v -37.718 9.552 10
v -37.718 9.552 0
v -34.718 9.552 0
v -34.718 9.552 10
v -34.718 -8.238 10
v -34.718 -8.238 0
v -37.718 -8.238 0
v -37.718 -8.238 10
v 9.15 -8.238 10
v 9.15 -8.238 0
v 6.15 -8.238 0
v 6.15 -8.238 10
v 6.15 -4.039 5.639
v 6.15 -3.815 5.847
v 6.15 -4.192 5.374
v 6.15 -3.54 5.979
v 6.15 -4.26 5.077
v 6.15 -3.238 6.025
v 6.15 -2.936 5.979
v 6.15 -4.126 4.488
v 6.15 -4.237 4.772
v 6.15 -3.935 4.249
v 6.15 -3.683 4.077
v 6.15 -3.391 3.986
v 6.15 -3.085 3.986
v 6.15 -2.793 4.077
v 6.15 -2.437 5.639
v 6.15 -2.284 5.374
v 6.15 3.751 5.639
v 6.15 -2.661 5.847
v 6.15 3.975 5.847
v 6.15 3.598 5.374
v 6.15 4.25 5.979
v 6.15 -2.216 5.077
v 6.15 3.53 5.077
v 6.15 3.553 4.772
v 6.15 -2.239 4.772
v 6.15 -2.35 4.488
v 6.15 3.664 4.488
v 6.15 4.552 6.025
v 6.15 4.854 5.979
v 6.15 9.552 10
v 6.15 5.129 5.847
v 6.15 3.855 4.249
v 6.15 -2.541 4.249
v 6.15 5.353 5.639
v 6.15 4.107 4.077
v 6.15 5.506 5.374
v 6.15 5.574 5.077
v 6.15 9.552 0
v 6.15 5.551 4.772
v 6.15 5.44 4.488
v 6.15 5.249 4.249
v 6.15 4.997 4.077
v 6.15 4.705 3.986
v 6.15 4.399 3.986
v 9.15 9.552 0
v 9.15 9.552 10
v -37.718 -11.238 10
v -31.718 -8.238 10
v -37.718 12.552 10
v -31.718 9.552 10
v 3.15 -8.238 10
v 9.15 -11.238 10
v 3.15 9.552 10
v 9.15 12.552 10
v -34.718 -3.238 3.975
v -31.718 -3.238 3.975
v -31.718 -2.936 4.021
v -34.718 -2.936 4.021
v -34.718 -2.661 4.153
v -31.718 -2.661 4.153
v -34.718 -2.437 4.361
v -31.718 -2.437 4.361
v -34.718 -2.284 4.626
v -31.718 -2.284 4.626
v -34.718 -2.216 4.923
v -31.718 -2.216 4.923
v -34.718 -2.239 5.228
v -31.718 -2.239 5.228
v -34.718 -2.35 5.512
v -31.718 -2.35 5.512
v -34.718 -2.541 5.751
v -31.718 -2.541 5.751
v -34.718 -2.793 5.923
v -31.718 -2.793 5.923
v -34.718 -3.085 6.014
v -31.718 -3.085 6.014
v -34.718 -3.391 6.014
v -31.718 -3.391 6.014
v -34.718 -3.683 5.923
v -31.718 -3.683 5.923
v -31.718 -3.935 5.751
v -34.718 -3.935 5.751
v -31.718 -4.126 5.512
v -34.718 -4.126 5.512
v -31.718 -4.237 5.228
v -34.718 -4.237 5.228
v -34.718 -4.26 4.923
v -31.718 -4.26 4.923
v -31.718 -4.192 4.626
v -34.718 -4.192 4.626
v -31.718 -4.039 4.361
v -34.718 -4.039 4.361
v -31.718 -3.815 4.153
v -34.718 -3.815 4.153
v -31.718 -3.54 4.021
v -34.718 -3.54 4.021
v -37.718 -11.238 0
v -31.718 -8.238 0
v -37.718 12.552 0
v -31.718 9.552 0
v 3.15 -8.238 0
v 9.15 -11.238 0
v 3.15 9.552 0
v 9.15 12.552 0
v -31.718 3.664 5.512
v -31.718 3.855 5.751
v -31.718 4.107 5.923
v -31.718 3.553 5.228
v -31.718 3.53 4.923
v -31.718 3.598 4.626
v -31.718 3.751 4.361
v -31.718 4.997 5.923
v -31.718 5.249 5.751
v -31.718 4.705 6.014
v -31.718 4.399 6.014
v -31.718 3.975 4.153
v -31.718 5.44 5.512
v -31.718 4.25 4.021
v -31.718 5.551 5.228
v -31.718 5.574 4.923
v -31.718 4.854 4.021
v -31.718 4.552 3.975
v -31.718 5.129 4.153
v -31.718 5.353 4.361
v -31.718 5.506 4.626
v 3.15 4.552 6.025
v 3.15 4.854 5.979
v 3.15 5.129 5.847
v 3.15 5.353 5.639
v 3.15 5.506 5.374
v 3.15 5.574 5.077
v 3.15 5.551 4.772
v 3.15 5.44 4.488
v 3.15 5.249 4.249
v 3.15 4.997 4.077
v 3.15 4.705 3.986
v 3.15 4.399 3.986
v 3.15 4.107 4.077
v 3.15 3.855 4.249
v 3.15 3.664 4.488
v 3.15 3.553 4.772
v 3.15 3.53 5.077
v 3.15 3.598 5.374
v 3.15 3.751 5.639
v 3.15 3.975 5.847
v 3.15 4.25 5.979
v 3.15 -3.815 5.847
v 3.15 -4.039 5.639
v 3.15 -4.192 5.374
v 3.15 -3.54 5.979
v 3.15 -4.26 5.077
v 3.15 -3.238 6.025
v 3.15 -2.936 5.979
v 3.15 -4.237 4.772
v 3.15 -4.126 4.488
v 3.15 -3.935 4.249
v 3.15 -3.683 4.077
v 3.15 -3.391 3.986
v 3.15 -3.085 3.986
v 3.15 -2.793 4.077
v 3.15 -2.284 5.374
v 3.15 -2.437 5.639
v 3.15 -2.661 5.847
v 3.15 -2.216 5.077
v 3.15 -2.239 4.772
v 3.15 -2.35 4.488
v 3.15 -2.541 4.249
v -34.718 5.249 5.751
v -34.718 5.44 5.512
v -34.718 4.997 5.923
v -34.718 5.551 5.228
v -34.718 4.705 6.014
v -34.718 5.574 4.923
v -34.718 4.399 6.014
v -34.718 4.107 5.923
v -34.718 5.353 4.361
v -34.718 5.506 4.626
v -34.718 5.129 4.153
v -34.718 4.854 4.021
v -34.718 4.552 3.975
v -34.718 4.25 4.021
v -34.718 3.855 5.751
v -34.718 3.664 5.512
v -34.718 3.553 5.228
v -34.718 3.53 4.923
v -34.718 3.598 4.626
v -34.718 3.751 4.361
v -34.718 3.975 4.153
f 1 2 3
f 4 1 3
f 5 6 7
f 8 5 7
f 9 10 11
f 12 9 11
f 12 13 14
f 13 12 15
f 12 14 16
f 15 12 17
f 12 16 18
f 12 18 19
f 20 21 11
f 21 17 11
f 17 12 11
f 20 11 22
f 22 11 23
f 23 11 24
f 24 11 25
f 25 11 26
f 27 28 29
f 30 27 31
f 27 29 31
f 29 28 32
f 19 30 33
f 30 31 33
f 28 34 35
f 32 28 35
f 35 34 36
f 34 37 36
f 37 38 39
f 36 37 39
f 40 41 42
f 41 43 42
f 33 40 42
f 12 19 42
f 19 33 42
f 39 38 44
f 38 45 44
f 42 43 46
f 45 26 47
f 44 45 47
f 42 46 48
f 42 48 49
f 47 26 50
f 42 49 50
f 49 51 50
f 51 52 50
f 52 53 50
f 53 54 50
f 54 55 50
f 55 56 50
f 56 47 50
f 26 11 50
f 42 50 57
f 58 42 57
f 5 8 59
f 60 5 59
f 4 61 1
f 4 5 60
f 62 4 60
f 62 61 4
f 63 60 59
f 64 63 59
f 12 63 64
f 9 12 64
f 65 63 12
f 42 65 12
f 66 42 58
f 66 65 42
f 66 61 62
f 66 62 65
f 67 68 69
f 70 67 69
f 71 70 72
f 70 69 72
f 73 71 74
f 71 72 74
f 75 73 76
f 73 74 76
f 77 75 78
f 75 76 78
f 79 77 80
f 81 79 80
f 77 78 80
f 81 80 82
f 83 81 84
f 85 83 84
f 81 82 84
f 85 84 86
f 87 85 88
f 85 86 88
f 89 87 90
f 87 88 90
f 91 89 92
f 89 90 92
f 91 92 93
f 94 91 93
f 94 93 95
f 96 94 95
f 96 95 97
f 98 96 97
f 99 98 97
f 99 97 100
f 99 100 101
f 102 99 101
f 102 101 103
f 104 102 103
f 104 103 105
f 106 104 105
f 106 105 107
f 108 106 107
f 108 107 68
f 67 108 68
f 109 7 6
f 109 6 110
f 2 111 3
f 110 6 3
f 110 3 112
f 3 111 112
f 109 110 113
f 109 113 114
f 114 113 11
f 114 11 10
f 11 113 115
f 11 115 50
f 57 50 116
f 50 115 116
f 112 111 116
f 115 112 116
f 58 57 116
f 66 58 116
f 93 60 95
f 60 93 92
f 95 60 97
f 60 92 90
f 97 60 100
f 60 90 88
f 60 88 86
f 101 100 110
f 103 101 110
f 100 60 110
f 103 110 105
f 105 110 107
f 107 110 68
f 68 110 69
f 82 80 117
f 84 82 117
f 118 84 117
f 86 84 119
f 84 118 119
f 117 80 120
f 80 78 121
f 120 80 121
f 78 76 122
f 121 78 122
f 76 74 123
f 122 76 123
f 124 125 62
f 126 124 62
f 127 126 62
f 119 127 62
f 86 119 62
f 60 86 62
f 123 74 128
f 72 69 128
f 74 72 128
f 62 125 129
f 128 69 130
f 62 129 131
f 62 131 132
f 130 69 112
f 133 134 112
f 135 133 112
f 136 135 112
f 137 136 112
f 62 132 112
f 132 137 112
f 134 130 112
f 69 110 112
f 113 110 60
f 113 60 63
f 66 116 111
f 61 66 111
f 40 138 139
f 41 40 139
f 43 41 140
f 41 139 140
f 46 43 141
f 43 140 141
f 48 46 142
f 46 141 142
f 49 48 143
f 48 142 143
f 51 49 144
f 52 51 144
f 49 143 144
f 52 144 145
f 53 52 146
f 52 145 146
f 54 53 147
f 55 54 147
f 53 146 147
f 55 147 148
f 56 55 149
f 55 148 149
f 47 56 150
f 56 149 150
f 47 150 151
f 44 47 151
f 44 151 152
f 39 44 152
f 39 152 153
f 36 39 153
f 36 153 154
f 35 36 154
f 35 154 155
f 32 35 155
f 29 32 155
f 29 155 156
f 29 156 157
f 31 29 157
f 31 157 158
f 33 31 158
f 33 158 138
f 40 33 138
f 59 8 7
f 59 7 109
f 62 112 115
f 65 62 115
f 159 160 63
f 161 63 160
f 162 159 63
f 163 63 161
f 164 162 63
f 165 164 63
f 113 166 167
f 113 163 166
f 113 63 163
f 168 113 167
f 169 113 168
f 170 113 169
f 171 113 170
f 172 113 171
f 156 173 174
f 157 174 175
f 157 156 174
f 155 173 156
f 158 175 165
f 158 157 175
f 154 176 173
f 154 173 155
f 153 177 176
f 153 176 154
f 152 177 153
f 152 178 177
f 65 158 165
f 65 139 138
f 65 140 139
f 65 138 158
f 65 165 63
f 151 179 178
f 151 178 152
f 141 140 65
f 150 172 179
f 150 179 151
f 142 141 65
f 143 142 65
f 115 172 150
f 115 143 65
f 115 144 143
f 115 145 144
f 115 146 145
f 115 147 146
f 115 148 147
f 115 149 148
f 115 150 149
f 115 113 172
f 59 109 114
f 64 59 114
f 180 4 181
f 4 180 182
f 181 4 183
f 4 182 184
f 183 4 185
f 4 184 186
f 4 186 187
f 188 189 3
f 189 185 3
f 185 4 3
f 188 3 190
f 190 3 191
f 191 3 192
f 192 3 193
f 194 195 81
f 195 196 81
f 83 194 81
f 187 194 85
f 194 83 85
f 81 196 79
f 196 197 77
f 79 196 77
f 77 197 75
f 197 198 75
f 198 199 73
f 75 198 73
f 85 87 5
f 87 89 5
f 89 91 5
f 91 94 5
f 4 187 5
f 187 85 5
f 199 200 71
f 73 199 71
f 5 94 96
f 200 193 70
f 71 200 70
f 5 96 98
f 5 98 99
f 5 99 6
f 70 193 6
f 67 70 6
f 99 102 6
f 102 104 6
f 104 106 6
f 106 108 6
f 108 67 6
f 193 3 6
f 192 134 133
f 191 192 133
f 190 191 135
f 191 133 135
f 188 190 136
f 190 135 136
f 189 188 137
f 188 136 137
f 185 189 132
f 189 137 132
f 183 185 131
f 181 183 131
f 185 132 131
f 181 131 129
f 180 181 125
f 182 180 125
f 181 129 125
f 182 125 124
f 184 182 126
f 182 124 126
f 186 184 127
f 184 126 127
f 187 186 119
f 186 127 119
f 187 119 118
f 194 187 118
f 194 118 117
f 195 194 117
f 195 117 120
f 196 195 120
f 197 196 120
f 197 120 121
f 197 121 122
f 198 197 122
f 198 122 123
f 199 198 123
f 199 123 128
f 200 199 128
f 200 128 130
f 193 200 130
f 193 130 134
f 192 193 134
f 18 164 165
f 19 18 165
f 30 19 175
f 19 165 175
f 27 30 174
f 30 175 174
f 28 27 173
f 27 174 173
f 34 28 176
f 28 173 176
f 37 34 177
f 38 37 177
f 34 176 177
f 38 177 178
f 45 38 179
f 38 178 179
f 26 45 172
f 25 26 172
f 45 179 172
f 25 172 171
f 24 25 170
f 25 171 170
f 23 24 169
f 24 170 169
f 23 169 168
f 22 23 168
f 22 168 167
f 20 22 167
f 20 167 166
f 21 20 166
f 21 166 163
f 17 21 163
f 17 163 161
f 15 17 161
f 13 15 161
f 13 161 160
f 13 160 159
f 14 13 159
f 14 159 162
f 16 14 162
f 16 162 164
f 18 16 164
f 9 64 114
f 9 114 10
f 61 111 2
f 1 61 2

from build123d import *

# Parameters (mm, degrees)
SKETCH1_W                    = 34.867947861
SKETCH1_H                    = 17.79
BOSS_EXTRUDE1_DEPTH          = 10
M2_5X0_45_TAPPED_HOLE2_D     = 2.05
M2_5X0_45_TAPPED_HOLE2_DEPTH = 7.25
M2_5X0_45_TAPPED_HOLE2_TIP   = 0.615882135
M2_5X0_45_TAPPED_HOLE1_D     = 2.05
M2_5X0_45_TAPPED_HOLE1_DEPTH = 7.25
M2_5X0_45_TAPPED_HOLE1_TIP   = 0.615882135


with BuildPart() as part:
    # Sketch1 → Boss-Extrude1 (new body)
    with BuildSketch(Plane.XY):
        Polygon((6.149632379, 9.551958914), (9.149632379, 9.551958914), (9.149632379, 12.551958914), (-37.718315482, 12.551958914), (-37.718315482, 9.551958914), (-34.718315482, 9.551958914), (-34.718315482, -8.238041086), (-37.718315482, -8.238041086), (-37.718315482, -11.238041086), (9.149632379, -11.238041086), (9.149632379, -8.238041086), (6.149632379, -8.238041086), align=None)
        with Locations((-14.284341552, 0.656958914)):
            Rectangle(SKETCH1_W, SKETCH1_H, mode=Mode.SUBTRACT)
    extrude(amount=BOSS_EXTRUDE1_DEPTH)

    # M2.5x0.45 Tapped Hole2
    with Locations(Plane.ZY.offset(34.718315482)):
        with Locations((5, 4.551958914), (5, -3.238041086)):
            Hole(M2_5X0_45_TAPPED_HOLE2_D / 2, depth=M2_5X0_45_TAPPED_HOLE2_DEPTH)
            with Locations((0, 0, -(M2_5X0_45_TAPPED_HOLE2_DEPTH + M2_5X0_45_TAPPED_HOLE2_TIP / 2))):  # 118° drill point
                Cone(0, M2_5X0_45_TAPPED_HOLE2_D / 2, M2_5X0_45_TAPPED_HOLE2_TIP, mode=Mode.SUBTRACT)

    # M2.5x0.45 Tapped Hole1
    with Locations(Plane(origin=(6.149632379, 2.476678441, 1.606875776), x_dir=(0, 0, -1), z_dir=(1, 0, 0))):
        with Locations((-3.393124224, 2.075280473), (-3.393124224, -5.714719527)):
            Hole(M2_5X0_45_TAPPED_HOLE1_D / 2, depth=M2_5X0_45_TAPPED_HOLE1_DEPTH)
            with Locations((0, 0, -(M2_5X0_45_TAPPED_HOLE1_DEPTH + M2_5X0_45_TAPPED_HOLE1_TIP / 2))):  # 118° drill point
                Cone(0, M2_5X0_45_TAPPED_HOLE1_D / 2, M2_5X0_45_TAPPED_HOLE1_TIP, mode=Mode.SUBTRACT)


solid = part.part
